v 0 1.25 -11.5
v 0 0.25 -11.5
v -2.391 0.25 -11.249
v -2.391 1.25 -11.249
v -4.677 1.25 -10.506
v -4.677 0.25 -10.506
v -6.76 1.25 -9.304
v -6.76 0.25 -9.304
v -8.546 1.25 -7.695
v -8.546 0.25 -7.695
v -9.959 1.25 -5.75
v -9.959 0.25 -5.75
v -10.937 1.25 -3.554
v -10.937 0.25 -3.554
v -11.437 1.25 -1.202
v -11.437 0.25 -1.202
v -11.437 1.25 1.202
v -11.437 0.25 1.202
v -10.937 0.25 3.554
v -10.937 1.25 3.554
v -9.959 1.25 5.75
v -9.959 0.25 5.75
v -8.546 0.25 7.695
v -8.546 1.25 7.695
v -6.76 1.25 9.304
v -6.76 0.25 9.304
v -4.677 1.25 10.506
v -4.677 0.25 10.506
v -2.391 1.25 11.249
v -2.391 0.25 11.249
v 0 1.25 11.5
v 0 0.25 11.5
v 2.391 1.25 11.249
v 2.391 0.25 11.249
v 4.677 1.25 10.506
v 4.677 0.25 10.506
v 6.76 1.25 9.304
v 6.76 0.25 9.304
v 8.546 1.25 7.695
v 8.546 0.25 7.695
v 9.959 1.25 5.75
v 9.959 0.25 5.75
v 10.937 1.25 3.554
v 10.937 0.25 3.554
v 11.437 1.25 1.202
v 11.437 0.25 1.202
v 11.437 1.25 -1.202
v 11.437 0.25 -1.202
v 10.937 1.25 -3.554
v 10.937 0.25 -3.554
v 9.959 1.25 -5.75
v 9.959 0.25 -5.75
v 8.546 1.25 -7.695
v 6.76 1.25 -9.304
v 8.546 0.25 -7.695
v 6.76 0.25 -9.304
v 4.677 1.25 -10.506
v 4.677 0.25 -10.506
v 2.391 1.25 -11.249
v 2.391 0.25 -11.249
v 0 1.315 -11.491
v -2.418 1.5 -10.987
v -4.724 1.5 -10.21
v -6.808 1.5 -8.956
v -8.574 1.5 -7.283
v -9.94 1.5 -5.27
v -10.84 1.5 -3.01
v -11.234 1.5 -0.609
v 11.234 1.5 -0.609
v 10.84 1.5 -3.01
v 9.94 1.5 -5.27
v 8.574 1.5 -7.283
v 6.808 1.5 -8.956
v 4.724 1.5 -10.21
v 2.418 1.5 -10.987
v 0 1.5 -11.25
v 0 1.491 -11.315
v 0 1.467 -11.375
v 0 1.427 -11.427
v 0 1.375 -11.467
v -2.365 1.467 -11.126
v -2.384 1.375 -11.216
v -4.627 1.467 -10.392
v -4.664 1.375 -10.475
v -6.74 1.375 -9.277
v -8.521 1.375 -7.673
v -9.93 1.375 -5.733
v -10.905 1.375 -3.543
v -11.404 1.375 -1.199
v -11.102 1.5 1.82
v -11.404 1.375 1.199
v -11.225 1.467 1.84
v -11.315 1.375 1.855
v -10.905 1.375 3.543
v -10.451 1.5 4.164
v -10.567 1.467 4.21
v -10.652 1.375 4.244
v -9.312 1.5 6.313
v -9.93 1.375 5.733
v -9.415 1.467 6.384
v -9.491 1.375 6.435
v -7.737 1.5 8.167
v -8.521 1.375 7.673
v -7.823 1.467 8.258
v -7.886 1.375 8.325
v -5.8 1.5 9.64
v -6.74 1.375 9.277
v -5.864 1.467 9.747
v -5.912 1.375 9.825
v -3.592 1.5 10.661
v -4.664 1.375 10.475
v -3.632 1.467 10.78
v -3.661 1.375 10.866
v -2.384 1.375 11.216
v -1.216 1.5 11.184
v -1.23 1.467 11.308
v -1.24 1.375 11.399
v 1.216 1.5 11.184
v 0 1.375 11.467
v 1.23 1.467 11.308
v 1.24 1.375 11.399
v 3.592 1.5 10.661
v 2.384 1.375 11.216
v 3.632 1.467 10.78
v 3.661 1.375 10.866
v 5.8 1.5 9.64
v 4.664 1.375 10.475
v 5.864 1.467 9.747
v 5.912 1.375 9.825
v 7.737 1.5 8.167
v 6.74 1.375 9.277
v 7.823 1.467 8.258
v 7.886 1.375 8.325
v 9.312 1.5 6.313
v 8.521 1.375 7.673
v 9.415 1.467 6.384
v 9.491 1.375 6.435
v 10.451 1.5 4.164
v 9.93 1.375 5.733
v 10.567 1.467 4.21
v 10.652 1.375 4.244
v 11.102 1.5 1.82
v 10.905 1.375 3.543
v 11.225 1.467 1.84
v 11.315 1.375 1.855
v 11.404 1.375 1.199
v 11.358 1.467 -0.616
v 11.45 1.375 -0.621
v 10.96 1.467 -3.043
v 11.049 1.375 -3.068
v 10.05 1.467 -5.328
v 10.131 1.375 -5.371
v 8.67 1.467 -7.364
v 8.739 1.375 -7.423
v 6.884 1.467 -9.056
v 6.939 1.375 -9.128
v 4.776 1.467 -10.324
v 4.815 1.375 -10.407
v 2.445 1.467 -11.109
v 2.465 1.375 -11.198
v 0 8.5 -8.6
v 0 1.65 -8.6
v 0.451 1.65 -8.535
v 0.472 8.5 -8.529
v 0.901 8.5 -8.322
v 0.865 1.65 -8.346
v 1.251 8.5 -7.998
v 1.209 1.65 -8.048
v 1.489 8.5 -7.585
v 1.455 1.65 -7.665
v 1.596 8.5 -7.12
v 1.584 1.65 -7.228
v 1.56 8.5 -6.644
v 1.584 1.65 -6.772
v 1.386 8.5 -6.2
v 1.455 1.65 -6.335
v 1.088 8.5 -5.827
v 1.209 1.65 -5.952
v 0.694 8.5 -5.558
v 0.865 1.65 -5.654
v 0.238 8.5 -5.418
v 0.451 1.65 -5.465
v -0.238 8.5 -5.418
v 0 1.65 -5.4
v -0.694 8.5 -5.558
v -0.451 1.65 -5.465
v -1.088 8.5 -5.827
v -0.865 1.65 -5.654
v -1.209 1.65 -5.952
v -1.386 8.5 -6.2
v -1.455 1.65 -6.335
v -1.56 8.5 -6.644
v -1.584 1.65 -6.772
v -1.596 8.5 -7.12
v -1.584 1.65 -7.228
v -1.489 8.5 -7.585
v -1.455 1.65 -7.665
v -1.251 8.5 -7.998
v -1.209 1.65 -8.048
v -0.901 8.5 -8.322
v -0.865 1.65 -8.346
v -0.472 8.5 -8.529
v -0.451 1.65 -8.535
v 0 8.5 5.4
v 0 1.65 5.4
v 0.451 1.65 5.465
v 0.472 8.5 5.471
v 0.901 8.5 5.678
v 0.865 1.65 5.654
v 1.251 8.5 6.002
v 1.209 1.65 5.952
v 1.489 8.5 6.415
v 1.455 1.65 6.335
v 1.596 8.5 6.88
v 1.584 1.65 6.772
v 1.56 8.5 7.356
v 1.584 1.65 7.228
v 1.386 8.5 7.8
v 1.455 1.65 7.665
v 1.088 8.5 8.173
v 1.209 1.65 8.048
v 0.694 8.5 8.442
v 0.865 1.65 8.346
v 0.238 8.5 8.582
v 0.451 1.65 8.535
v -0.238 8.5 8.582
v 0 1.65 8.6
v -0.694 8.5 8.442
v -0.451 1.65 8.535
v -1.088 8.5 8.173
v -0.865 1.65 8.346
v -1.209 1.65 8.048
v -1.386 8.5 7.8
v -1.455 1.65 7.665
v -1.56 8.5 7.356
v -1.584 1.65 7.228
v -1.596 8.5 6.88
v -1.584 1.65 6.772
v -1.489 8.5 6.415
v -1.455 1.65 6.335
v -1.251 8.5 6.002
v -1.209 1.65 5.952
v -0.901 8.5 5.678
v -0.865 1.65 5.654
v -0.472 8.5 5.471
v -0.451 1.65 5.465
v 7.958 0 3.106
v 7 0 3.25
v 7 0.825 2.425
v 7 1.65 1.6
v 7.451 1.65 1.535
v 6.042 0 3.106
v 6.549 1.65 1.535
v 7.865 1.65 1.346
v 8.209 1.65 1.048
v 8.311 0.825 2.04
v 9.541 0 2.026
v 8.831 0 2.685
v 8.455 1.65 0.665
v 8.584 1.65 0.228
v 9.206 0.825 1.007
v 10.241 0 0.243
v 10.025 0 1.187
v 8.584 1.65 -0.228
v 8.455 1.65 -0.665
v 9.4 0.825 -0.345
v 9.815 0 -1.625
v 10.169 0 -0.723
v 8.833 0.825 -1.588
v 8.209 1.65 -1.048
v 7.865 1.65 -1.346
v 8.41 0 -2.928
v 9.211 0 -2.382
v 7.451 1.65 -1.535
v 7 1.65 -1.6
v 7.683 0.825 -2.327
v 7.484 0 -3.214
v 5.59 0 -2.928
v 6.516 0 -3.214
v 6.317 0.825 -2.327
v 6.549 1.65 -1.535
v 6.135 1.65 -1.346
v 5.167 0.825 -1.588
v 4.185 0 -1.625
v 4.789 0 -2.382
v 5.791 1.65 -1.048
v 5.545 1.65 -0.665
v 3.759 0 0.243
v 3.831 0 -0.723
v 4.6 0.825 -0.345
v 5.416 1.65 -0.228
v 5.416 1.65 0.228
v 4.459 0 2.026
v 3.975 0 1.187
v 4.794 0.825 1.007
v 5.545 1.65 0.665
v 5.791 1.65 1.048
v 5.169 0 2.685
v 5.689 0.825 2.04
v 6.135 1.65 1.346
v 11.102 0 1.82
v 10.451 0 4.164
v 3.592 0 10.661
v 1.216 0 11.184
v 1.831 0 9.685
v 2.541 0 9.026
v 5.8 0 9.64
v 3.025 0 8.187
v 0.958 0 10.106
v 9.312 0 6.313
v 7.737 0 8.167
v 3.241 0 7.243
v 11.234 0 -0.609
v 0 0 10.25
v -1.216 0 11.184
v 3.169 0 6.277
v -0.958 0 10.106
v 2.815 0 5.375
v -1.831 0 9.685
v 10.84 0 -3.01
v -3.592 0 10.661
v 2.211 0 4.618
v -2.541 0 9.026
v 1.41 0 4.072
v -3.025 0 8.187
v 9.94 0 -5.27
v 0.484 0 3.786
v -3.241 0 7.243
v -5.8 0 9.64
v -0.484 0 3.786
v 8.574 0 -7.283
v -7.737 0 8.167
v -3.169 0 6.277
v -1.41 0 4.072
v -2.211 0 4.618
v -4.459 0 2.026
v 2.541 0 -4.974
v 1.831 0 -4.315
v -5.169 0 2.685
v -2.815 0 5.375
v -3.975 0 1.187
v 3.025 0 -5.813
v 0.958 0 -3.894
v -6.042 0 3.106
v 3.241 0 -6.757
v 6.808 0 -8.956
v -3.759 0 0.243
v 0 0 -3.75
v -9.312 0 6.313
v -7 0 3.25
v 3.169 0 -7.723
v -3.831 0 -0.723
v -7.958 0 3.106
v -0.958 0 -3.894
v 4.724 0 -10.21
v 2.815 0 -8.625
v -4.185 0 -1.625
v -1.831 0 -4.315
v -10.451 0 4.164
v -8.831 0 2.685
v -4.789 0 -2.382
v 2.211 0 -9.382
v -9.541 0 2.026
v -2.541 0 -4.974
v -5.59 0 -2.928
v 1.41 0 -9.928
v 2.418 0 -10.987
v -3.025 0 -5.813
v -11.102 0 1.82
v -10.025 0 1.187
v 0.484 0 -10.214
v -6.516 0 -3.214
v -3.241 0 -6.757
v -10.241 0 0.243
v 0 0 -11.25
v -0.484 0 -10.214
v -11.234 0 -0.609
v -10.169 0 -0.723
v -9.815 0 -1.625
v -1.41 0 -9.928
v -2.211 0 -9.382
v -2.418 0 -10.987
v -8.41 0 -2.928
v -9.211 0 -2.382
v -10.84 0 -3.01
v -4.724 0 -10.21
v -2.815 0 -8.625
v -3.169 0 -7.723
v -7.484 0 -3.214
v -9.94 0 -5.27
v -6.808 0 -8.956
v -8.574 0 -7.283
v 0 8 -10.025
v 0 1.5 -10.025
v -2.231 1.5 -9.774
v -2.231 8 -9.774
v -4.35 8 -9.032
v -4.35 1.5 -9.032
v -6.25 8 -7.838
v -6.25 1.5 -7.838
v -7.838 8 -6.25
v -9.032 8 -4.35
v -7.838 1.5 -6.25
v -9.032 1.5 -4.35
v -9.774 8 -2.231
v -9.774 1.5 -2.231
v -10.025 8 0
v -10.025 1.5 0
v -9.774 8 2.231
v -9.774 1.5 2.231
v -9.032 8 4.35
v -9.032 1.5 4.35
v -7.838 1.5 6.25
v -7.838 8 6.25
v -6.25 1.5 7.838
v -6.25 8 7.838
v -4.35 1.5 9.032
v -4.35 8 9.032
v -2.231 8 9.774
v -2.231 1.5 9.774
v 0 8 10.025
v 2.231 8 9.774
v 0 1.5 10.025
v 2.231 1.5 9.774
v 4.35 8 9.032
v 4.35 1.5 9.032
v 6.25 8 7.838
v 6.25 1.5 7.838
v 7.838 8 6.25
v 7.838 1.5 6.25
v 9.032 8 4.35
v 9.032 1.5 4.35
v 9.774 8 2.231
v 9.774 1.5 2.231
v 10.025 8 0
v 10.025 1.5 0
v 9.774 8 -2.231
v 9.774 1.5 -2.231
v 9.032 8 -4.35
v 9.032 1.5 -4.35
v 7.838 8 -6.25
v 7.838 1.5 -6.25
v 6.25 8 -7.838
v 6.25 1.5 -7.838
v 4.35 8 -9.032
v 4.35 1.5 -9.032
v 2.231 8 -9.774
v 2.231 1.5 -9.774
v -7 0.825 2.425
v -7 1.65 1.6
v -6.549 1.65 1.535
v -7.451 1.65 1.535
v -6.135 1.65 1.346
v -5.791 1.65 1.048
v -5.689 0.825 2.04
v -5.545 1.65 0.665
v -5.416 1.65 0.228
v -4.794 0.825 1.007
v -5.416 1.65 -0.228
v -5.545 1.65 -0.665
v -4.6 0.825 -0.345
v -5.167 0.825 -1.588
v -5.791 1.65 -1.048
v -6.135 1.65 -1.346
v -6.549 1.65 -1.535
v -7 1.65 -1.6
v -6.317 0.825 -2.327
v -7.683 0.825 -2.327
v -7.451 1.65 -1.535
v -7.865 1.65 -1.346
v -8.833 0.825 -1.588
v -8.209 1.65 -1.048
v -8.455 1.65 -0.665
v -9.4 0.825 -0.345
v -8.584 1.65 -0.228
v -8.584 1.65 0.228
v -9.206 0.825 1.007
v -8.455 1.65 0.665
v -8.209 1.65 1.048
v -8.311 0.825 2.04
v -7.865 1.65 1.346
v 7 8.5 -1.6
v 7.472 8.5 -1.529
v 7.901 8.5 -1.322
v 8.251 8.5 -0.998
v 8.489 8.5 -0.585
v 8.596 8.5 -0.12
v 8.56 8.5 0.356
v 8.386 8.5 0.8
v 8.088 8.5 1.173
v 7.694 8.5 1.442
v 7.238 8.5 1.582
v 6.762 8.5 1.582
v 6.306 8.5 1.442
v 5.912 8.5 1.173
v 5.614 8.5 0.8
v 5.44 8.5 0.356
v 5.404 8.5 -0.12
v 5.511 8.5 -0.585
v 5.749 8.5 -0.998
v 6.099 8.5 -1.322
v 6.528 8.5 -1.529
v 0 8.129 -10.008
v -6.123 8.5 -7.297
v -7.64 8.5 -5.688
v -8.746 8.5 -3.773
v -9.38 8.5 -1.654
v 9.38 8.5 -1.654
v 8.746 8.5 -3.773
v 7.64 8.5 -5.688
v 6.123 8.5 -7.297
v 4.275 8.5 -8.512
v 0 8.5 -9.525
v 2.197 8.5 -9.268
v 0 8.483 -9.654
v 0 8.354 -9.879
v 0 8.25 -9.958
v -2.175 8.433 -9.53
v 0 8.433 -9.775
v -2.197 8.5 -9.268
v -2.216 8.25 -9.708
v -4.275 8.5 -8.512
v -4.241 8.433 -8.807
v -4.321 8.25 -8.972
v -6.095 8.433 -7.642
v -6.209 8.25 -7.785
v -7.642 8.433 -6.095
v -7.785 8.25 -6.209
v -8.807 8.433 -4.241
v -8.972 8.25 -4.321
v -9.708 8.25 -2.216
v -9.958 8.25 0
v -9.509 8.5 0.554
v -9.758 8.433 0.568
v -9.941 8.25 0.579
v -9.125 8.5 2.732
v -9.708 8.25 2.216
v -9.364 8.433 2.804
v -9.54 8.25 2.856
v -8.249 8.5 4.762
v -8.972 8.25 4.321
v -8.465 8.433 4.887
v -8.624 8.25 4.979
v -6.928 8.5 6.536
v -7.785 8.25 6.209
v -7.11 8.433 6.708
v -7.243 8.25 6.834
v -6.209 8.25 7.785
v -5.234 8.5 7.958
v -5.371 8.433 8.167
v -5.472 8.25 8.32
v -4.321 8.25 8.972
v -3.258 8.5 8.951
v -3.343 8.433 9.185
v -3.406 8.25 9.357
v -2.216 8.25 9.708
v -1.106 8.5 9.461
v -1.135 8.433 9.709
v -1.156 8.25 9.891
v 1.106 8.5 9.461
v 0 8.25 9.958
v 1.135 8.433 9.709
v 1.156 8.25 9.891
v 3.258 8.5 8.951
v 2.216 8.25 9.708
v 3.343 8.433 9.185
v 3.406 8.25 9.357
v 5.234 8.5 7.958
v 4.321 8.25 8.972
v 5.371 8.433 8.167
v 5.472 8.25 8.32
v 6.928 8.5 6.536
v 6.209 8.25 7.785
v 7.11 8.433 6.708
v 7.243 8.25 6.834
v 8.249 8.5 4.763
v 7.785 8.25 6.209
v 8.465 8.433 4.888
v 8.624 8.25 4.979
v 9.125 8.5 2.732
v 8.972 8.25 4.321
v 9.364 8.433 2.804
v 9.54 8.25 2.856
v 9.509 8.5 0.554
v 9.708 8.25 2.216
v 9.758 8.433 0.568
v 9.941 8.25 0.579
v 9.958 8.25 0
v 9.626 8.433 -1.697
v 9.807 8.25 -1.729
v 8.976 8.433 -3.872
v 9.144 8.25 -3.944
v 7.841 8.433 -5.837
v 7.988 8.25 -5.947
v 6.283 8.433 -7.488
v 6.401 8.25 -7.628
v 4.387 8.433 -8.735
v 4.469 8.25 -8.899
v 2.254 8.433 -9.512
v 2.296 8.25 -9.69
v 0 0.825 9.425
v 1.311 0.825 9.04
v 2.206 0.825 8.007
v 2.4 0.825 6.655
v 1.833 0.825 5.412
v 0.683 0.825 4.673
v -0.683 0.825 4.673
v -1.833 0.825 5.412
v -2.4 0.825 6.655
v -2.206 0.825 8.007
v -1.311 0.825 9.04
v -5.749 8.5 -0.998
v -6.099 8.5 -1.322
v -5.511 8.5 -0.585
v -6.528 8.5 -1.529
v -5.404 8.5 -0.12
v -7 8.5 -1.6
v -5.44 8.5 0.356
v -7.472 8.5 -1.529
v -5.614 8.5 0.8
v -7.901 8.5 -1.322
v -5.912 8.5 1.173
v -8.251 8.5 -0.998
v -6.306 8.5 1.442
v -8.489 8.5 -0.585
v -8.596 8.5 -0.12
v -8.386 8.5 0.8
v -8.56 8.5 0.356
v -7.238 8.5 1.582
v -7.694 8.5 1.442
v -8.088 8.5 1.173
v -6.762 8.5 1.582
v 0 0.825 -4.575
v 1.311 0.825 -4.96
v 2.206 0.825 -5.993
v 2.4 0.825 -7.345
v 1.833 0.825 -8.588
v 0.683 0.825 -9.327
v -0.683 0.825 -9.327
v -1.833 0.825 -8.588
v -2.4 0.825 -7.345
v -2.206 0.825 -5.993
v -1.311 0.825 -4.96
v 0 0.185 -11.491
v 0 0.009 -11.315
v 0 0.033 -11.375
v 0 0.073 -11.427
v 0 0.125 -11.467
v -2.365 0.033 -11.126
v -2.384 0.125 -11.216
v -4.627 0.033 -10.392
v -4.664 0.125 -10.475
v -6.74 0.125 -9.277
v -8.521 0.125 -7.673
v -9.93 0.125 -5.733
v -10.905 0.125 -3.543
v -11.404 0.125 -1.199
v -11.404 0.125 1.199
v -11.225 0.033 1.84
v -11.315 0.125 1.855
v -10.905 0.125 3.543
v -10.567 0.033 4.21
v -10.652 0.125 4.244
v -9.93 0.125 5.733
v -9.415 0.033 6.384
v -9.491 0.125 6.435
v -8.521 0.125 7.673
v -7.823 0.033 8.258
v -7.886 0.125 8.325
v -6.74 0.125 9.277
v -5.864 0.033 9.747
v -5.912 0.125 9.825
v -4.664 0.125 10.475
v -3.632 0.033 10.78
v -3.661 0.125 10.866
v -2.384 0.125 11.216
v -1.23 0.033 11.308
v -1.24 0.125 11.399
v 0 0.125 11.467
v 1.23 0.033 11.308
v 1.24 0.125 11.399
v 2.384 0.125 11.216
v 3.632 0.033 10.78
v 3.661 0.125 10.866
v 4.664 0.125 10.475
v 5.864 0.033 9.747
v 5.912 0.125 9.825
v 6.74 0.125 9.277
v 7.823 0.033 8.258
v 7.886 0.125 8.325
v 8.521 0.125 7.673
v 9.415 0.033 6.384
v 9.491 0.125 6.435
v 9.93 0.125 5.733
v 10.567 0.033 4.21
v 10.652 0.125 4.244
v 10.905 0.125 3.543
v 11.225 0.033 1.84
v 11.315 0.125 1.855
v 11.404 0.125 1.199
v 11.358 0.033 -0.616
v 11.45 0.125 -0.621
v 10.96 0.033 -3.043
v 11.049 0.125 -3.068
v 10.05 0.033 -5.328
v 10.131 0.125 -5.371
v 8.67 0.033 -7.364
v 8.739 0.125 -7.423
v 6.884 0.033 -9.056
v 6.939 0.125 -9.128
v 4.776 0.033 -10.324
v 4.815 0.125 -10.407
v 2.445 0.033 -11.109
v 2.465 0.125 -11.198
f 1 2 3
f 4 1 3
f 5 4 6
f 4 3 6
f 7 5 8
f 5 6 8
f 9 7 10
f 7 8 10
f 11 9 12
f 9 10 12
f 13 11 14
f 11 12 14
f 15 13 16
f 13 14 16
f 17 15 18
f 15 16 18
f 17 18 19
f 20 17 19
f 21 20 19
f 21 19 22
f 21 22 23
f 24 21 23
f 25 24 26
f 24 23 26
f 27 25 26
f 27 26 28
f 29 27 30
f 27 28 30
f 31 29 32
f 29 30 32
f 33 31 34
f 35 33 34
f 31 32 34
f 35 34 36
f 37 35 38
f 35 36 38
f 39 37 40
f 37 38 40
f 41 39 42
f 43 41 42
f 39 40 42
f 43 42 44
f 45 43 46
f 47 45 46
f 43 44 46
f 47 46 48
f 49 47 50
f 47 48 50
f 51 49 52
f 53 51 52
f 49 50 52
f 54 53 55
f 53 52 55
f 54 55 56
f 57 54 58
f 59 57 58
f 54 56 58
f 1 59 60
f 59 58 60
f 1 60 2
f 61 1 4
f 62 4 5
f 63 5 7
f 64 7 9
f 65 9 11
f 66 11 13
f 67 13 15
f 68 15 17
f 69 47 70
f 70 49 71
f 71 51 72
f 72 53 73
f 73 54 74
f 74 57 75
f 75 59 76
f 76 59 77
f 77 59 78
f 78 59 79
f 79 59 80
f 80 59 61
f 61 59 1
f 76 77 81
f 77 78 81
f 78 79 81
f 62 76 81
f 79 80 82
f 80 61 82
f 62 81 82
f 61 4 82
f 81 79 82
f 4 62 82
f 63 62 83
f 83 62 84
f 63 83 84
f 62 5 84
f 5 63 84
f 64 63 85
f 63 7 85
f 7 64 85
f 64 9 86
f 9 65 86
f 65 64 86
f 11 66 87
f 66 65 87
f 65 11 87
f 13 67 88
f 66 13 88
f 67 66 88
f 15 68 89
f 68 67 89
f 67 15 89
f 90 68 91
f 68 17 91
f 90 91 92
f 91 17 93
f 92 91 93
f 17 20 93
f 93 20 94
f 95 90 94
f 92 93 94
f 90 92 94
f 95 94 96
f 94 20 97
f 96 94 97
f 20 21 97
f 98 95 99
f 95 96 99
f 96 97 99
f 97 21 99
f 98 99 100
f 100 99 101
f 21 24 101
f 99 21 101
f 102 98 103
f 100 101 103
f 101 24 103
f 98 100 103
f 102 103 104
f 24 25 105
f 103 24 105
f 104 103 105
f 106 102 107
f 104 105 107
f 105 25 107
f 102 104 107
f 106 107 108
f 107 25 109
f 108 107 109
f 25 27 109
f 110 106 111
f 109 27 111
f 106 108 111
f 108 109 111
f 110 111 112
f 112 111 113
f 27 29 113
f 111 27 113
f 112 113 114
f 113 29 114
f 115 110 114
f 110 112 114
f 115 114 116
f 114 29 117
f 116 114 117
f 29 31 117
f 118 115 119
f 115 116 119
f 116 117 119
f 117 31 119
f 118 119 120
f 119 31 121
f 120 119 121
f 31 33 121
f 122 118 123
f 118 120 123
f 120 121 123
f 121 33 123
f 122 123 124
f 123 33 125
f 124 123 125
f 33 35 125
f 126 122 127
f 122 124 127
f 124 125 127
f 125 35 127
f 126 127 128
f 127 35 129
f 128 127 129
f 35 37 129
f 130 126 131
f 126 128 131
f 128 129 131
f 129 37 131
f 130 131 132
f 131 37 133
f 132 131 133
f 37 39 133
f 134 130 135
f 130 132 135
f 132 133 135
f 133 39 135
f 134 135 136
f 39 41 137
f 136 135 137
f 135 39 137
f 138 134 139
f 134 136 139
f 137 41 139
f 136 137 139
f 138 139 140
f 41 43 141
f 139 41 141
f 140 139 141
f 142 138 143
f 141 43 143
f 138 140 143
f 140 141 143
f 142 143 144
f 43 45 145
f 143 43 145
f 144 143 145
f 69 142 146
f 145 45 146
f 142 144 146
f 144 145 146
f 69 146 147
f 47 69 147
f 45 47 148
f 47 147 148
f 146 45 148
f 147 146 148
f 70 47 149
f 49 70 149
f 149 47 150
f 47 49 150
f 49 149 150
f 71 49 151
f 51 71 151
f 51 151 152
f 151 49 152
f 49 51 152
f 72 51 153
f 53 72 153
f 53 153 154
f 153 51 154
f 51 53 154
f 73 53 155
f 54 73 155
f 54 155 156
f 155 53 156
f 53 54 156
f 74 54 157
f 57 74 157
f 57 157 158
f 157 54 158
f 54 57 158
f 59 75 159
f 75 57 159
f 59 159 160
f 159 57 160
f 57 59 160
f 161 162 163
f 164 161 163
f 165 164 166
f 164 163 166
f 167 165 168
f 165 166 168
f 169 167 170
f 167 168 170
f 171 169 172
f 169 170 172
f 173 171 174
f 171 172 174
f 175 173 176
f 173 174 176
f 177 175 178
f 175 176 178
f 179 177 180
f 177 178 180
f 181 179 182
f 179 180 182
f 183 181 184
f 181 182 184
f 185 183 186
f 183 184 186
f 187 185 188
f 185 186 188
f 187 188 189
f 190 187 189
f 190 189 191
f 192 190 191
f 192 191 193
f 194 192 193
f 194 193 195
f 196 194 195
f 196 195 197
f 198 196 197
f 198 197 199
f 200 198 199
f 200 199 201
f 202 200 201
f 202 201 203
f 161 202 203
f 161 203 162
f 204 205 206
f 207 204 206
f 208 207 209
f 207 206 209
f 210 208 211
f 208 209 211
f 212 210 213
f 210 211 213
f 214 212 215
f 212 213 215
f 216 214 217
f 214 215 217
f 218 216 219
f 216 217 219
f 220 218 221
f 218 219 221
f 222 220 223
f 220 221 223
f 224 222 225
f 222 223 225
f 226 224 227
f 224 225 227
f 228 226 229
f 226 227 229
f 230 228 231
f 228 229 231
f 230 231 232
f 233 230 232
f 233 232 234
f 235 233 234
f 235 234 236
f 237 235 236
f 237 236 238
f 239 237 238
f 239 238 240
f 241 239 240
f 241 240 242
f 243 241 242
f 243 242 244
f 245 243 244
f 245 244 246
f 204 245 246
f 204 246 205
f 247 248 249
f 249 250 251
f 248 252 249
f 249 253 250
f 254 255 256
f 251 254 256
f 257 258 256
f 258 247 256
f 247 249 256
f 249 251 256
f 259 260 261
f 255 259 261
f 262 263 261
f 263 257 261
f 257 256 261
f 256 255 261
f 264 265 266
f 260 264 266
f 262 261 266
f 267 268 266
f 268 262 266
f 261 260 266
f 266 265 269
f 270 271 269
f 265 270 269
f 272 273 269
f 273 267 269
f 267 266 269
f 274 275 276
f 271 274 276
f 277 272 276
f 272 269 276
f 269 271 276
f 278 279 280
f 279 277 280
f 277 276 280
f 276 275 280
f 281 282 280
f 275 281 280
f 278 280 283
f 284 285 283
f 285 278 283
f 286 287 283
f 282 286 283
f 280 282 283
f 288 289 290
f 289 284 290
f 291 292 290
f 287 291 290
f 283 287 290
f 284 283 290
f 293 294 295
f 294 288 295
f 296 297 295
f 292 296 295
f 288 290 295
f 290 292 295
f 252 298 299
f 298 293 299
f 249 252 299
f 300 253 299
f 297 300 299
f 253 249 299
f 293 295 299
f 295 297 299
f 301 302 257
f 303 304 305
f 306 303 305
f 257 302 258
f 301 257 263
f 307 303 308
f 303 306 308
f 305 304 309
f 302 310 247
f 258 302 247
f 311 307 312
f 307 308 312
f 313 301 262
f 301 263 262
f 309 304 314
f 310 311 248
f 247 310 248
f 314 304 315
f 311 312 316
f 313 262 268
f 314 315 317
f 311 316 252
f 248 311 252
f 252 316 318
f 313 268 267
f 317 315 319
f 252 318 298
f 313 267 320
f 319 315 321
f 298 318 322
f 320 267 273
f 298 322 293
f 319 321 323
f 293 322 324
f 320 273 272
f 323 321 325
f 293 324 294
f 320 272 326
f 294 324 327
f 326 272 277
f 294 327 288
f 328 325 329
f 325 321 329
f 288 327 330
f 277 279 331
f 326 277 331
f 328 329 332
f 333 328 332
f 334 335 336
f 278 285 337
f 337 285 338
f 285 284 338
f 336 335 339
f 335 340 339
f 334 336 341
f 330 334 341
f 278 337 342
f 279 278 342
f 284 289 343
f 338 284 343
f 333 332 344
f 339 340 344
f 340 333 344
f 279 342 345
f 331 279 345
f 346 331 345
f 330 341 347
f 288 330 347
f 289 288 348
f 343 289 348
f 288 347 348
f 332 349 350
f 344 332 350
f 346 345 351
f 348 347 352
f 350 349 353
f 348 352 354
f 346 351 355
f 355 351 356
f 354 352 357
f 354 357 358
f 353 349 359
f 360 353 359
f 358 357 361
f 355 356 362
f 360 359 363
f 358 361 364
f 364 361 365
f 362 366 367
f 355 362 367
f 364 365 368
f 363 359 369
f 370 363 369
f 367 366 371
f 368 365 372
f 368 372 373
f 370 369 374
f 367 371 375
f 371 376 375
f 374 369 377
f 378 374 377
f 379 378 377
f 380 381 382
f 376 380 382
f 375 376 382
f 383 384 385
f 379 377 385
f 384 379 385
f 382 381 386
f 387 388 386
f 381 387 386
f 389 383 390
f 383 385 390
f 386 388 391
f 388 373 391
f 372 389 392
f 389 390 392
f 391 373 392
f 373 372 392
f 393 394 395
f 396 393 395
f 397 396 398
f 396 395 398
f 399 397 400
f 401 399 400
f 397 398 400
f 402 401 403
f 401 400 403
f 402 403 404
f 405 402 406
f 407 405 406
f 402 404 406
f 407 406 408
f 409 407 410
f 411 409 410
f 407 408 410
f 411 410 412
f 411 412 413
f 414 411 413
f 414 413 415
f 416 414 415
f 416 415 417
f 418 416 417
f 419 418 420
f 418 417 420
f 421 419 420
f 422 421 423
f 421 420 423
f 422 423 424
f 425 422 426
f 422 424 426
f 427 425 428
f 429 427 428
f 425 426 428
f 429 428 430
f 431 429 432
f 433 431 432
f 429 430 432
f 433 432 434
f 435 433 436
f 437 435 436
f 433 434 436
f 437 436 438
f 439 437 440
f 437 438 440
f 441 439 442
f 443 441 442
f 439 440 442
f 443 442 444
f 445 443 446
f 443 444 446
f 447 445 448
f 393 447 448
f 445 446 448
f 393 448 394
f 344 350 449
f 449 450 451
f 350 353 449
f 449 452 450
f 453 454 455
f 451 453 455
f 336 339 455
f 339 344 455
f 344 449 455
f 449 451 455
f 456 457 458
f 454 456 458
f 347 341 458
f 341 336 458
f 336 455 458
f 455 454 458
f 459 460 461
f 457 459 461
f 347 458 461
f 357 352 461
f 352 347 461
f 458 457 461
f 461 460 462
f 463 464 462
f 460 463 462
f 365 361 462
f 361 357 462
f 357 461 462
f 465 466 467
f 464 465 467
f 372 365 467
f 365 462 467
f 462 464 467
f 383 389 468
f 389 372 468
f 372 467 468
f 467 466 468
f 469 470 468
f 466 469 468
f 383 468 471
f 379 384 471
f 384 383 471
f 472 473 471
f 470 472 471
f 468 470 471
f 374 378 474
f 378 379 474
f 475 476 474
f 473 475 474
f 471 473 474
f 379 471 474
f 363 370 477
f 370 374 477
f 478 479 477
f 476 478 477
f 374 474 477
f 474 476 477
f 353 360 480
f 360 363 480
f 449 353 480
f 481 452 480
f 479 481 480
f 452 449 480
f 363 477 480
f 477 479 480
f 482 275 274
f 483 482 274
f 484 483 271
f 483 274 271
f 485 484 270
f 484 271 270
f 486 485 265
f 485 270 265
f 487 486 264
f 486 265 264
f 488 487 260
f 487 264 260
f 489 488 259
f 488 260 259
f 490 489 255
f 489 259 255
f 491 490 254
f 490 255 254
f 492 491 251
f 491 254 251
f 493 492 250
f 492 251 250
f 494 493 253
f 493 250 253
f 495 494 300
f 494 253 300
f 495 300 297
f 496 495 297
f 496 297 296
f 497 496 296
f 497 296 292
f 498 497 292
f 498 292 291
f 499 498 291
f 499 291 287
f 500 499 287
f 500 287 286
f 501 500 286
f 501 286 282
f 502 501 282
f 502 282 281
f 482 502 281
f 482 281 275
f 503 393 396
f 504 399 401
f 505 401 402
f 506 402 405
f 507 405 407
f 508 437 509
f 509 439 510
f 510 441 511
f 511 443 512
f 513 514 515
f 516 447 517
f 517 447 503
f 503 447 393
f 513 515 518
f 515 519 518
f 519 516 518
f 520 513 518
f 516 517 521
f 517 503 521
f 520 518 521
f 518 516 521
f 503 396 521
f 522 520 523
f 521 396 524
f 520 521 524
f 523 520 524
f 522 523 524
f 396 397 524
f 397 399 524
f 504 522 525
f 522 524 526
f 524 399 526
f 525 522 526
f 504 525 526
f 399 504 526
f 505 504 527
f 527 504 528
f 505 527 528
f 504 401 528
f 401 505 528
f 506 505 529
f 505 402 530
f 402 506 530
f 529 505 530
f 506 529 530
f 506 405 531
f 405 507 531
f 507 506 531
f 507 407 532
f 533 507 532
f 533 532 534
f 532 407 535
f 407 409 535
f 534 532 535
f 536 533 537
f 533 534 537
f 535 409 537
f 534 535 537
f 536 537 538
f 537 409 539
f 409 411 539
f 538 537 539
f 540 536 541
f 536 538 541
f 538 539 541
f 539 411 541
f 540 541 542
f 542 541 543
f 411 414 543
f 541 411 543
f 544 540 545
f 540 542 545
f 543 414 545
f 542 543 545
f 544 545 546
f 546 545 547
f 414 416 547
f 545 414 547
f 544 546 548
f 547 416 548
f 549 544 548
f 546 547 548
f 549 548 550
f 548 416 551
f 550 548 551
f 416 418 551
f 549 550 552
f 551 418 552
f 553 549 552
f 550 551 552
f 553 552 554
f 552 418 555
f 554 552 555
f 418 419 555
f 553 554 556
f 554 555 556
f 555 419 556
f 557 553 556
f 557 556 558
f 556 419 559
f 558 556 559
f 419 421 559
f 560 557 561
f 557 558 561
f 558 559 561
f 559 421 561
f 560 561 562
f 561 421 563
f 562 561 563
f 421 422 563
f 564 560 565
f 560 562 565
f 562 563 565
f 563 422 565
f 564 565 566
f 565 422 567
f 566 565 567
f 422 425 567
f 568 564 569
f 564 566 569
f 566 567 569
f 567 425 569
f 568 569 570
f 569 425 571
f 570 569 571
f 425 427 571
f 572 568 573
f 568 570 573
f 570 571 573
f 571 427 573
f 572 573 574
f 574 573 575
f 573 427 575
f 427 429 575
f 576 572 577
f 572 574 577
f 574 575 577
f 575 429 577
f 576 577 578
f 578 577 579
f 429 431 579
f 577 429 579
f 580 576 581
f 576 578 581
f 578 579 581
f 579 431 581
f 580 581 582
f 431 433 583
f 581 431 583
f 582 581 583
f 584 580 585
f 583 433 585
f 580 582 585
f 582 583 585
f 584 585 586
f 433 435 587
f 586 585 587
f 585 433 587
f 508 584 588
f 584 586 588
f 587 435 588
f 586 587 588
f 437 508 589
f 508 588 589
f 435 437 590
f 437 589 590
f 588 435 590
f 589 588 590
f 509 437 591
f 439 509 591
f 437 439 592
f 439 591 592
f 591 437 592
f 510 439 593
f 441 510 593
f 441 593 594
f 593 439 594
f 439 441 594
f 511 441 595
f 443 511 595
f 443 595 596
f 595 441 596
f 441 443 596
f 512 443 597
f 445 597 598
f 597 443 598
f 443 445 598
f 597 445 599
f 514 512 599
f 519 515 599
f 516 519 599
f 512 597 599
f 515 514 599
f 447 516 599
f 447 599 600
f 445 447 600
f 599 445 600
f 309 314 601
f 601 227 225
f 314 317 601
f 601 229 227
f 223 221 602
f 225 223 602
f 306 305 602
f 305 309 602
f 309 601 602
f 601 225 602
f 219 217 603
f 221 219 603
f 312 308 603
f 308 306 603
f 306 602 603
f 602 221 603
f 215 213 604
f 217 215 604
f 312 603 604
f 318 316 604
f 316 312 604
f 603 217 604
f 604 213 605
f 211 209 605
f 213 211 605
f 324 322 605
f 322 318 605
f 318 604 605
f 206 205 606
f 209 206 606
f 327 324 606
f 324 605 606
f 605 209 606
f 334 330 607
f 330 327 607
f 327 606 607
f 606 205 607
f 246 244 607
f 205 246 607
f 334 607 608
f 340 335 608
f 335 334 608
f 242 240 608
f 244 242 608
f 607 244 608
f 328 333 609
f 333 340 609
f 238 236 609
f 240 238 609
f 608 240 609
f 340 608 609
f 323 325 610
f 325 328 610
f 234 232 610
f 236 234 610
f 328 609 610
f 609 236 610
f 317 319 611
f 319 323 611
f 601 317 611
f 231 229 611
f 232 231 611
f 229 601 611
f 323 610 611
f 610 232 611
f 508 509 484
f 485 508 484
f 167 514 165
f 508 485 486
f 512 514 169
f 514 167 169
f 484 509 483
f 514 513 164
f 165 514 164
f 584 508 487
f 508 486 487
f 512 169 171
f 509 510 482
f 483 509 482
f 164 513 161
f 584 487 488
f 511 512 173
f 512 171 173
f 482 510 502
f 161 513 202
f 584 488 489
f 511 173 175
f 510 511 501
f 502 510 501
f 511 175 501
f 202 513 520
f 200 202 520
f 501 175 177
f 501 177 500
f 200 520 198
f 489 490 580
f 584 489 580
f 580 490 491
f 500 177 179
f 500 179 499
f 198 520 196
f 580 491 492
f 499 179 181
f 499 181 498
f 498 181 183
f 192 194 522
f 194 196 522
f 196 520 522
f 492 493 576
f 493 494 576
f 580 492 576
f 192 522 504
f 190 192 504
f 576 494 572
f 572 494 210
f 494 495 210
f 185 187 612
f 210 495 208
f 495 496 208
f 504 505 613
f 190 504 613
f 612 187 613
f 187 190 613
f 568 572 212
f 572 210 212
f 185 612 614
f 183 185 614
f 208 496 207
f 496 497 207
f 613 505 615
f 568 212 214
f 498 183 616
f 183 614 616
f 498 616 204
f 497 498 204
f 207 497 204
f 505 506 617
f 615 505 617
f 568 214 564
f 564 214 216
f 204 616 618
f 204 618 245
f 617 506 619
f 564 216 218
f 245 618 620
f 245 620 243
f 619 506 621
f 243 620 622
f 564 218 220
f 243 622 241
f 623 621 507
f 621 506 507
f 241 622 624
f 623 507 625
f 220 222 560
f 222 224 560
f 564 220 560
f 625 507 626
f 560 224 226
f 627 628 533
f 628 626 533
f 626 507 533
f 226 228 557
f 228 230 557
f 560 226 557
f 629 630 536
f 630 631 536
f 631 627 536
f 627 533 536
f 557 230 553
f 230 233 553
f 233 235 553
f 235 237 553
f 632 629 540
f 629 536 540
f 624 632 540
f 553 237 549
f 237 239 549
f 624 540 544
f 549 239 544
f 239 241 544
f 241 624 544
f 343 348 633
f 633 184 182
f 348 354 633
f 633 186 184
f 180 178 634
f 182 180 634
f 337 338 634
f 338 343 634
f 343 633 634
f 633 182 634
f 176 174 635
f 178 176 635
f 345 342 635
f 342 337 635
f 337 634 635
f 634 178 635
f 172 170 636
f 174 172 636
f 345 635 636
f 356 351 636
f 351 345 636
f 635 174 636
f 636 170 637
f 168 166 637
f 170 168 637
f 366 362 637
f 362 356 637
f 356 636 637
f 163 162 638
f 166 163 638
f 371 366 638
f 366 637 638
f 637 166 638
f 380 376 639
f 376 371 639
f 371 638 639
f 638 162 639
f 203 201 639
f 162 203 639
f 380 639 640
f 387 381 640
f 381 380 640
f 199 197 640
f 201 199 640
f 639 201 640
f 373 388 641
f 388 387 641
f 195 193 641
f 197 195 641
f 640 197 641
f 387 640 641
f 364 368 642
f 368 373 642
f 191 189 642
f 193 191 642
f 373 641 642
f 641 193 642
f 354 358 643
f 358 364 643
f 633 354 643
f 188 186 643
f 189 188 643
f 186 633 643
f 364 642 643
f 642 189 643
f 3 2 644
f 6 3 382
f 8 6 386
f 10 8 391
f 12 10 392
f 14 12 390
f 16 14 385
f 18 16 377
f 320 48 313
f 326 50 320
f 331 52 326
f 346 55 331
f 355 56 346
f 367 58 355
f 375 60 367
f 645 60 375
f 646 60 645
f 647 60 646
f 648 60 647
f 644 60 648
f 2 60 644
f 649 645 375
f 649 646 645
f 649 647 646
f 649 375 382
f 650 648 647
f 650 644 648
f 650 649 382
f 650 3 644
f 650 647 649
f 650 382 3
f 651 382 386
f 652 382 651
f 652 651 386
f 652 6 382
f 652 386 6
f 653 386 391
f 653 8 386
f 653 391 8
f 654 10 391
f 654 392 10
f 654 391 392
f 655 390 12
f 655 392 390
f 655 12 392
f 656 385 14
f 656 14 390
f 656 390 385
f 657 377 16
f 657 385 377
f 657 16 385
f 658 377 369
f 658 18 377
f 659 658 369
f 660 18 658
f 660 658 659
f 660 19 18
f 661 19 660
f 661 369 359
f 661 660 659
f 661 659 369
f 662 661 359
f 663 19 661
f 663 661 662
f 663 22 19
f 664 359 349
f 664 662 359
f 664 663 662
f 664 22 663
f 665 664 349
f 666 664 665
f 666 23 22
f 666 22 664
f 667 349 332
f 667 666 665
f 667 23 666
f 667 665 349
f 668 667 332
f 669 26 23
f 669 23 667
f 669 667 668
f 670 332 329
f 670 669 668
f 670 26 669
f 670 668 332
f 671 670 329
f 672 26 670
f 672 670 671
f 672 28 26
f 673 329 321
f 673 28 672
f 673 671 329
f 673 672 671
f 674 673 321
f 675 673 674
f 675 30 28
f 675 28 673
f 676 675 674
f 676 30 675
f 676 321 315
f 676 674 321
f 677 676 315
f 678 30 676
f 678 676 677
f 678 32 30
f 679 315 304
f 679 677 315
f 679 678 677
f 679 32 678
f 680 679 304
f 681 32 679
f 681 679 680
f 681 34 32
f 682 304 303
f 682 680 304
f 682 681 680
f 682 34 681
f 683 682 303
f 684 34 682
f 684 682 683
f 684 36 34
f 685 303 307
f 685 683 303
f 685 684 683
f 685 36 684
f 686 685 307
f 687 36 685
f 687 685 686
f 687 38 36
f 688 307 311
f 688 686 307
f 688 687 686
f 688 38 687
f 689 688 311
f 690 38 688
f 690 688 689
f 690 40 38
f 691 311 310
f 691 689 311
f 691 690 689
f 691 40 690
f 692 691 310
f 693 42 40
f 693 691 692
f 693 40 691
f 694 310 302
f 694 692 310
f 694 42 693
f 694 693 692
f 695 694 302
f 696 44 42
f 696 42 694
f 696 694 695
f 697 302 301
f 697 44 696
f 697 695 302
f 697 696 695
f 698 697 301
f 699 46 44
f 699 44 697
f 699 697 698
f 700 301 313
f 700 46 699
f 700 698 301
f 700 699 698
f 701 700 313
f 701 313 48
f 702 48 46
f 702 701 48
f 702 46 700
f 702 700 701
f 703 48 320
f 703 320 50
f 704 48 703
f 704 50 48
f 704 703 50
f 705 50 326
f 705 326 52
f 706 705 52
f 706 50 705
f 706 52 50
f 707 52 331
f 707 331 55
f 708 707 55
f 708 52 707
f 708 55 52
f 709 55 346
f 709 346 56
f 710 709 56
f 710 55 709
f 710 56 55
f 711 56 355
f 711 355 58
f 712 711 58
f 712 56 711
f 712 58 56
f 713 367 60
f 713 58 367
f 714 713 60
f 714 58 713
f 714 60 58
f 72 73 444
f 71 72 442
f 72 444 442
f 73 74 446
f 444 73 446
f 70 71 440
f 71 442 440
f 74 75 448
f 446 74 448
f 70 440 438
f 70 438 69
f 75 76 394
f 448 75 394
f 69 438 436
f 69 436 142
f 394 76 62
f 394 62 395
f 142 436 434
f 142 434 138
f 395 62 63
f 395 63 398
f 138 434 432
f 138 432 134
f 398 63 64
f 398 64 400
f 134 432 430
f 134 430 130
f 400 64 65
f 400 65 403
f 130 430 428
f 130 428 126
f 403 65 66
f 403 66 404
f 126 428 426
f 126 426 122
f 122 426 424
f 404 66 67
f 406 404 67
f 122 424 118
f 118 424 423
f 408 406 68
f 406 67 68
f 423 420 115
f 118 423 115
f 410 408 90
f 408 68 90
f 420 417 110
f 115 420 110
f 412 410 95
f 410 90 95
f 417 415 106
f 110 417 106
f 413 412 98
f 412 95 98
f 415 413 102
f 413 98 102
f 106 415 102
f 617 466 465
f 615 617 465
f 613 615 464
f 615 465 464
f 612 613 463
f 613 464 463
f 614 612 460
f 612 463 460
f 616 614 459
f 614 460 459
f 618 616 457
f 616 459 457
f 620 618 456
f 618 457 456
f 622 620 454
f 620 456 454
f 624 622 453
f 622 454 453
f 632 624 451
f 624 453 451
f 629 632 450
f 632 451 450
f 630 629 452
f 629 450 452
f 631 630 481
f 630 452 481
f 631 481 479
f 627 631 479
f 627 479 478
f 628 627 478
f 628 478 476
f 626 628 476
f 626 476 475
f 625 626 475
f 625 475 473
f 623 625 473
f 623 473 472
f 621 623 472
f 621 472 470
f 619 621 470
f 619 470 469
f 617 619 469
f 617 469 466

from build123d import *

# Parameters (mm, degrees)
SKETCH2_R                                       = 1.6
CUT_EXTRUDE1_DEPTH                              = 19.350749304
CSK_FOR_M3_FLAT_HEAD_MACHINE_SCREW1_D           = 2.8
CSK_FOR_M3_FLAT_HEAD_MACHINE_SCREW1_CSINK_D     = 6.5
CSK_FOR_M3_FLAT_HEAD_MACHINE_SCREW1_CSINK_ANGLE = 90
FILLET1_R                                       = 0.5
FILLET2_R                                       = 0.25


with BuildPart() as part:
    # Sketch1 → Revolve1 (revolve)
    with BuildSketch(Plane.XY, mode=Mode.PRIVATE) as revolve1_sk:
        Polygon((0, 8.5), (10.025, 8.5), (10.025, 1.5), (11.5, 1.5), (11.5, 0), (0, 0), align=None)
    revolve(revolve1_sk.sketch.rotate(Axis((0, 0, 0), (0, 1, 0)), 90), axis=Axis((0, 0, 0), (0, 1, 0)))

    # Sketch2 → Cut-Extrude1 (cut, through all)
    with BuildSketch(Plane.XZ):
        with Locations(Location((0, 7, 0), (0, 0, 270))):
            Circle(SKETCH2_R)
        with Locations(Location((7, 0, 0), (0, 0, 270))):
            Circle(SKETCH2_R)
        with Locations(Location((0, -7, 0), (0, 0, 270))):
            Circle(SKETCH2_R)
        with Locations(Location((-7, 0, 0), (0, 0, 270))):
            Circle(SKETCH2_R)
    extrude(amount=-CUT_EXTRUDE1_DEPTH, mode=Mode.SUBTRACT)

    # CSK for M3 Flat Head Machine Screw1 (through all)
    with Locations(Plane(origin=(0, 0, 7), x_dir=(0, 0, -1), z_dir=(0, -1, 0))):
        with Locations((0, 0), (7, 7), (14, 0), (7, -7)):
            CounterSinkHole(CSK_FOR_M3_FLAT_HEAD_MACHINE_SCREW1_D / 2, CSK_FOR_M3_FLAT_HEAD_MACHINE_SCREW1_CSINK_D / 2, counter_sink_angle=CSK_FOR_M3_FLAT_HEAD_MACHINE_SCREW1_CSINK_ANGLE)

    # Fillet1
    fillet1_edges = [part.edges().sort_by_distance(p)[0] for p in [
        (0, 8.5, 10.025),
    ]]
    fillet(fillet1_edges, radius=FILLET1_R)

    # Fillet2
    fillet2_edges = [part.edges().sort_by_distance(p)[0] for p in [
        (0, 0, 11.5),
        (0, 1.5, 11.5),
    ]]
    fillet(fillet2_edges, radius=FILLET2_R)


solid = part.part
